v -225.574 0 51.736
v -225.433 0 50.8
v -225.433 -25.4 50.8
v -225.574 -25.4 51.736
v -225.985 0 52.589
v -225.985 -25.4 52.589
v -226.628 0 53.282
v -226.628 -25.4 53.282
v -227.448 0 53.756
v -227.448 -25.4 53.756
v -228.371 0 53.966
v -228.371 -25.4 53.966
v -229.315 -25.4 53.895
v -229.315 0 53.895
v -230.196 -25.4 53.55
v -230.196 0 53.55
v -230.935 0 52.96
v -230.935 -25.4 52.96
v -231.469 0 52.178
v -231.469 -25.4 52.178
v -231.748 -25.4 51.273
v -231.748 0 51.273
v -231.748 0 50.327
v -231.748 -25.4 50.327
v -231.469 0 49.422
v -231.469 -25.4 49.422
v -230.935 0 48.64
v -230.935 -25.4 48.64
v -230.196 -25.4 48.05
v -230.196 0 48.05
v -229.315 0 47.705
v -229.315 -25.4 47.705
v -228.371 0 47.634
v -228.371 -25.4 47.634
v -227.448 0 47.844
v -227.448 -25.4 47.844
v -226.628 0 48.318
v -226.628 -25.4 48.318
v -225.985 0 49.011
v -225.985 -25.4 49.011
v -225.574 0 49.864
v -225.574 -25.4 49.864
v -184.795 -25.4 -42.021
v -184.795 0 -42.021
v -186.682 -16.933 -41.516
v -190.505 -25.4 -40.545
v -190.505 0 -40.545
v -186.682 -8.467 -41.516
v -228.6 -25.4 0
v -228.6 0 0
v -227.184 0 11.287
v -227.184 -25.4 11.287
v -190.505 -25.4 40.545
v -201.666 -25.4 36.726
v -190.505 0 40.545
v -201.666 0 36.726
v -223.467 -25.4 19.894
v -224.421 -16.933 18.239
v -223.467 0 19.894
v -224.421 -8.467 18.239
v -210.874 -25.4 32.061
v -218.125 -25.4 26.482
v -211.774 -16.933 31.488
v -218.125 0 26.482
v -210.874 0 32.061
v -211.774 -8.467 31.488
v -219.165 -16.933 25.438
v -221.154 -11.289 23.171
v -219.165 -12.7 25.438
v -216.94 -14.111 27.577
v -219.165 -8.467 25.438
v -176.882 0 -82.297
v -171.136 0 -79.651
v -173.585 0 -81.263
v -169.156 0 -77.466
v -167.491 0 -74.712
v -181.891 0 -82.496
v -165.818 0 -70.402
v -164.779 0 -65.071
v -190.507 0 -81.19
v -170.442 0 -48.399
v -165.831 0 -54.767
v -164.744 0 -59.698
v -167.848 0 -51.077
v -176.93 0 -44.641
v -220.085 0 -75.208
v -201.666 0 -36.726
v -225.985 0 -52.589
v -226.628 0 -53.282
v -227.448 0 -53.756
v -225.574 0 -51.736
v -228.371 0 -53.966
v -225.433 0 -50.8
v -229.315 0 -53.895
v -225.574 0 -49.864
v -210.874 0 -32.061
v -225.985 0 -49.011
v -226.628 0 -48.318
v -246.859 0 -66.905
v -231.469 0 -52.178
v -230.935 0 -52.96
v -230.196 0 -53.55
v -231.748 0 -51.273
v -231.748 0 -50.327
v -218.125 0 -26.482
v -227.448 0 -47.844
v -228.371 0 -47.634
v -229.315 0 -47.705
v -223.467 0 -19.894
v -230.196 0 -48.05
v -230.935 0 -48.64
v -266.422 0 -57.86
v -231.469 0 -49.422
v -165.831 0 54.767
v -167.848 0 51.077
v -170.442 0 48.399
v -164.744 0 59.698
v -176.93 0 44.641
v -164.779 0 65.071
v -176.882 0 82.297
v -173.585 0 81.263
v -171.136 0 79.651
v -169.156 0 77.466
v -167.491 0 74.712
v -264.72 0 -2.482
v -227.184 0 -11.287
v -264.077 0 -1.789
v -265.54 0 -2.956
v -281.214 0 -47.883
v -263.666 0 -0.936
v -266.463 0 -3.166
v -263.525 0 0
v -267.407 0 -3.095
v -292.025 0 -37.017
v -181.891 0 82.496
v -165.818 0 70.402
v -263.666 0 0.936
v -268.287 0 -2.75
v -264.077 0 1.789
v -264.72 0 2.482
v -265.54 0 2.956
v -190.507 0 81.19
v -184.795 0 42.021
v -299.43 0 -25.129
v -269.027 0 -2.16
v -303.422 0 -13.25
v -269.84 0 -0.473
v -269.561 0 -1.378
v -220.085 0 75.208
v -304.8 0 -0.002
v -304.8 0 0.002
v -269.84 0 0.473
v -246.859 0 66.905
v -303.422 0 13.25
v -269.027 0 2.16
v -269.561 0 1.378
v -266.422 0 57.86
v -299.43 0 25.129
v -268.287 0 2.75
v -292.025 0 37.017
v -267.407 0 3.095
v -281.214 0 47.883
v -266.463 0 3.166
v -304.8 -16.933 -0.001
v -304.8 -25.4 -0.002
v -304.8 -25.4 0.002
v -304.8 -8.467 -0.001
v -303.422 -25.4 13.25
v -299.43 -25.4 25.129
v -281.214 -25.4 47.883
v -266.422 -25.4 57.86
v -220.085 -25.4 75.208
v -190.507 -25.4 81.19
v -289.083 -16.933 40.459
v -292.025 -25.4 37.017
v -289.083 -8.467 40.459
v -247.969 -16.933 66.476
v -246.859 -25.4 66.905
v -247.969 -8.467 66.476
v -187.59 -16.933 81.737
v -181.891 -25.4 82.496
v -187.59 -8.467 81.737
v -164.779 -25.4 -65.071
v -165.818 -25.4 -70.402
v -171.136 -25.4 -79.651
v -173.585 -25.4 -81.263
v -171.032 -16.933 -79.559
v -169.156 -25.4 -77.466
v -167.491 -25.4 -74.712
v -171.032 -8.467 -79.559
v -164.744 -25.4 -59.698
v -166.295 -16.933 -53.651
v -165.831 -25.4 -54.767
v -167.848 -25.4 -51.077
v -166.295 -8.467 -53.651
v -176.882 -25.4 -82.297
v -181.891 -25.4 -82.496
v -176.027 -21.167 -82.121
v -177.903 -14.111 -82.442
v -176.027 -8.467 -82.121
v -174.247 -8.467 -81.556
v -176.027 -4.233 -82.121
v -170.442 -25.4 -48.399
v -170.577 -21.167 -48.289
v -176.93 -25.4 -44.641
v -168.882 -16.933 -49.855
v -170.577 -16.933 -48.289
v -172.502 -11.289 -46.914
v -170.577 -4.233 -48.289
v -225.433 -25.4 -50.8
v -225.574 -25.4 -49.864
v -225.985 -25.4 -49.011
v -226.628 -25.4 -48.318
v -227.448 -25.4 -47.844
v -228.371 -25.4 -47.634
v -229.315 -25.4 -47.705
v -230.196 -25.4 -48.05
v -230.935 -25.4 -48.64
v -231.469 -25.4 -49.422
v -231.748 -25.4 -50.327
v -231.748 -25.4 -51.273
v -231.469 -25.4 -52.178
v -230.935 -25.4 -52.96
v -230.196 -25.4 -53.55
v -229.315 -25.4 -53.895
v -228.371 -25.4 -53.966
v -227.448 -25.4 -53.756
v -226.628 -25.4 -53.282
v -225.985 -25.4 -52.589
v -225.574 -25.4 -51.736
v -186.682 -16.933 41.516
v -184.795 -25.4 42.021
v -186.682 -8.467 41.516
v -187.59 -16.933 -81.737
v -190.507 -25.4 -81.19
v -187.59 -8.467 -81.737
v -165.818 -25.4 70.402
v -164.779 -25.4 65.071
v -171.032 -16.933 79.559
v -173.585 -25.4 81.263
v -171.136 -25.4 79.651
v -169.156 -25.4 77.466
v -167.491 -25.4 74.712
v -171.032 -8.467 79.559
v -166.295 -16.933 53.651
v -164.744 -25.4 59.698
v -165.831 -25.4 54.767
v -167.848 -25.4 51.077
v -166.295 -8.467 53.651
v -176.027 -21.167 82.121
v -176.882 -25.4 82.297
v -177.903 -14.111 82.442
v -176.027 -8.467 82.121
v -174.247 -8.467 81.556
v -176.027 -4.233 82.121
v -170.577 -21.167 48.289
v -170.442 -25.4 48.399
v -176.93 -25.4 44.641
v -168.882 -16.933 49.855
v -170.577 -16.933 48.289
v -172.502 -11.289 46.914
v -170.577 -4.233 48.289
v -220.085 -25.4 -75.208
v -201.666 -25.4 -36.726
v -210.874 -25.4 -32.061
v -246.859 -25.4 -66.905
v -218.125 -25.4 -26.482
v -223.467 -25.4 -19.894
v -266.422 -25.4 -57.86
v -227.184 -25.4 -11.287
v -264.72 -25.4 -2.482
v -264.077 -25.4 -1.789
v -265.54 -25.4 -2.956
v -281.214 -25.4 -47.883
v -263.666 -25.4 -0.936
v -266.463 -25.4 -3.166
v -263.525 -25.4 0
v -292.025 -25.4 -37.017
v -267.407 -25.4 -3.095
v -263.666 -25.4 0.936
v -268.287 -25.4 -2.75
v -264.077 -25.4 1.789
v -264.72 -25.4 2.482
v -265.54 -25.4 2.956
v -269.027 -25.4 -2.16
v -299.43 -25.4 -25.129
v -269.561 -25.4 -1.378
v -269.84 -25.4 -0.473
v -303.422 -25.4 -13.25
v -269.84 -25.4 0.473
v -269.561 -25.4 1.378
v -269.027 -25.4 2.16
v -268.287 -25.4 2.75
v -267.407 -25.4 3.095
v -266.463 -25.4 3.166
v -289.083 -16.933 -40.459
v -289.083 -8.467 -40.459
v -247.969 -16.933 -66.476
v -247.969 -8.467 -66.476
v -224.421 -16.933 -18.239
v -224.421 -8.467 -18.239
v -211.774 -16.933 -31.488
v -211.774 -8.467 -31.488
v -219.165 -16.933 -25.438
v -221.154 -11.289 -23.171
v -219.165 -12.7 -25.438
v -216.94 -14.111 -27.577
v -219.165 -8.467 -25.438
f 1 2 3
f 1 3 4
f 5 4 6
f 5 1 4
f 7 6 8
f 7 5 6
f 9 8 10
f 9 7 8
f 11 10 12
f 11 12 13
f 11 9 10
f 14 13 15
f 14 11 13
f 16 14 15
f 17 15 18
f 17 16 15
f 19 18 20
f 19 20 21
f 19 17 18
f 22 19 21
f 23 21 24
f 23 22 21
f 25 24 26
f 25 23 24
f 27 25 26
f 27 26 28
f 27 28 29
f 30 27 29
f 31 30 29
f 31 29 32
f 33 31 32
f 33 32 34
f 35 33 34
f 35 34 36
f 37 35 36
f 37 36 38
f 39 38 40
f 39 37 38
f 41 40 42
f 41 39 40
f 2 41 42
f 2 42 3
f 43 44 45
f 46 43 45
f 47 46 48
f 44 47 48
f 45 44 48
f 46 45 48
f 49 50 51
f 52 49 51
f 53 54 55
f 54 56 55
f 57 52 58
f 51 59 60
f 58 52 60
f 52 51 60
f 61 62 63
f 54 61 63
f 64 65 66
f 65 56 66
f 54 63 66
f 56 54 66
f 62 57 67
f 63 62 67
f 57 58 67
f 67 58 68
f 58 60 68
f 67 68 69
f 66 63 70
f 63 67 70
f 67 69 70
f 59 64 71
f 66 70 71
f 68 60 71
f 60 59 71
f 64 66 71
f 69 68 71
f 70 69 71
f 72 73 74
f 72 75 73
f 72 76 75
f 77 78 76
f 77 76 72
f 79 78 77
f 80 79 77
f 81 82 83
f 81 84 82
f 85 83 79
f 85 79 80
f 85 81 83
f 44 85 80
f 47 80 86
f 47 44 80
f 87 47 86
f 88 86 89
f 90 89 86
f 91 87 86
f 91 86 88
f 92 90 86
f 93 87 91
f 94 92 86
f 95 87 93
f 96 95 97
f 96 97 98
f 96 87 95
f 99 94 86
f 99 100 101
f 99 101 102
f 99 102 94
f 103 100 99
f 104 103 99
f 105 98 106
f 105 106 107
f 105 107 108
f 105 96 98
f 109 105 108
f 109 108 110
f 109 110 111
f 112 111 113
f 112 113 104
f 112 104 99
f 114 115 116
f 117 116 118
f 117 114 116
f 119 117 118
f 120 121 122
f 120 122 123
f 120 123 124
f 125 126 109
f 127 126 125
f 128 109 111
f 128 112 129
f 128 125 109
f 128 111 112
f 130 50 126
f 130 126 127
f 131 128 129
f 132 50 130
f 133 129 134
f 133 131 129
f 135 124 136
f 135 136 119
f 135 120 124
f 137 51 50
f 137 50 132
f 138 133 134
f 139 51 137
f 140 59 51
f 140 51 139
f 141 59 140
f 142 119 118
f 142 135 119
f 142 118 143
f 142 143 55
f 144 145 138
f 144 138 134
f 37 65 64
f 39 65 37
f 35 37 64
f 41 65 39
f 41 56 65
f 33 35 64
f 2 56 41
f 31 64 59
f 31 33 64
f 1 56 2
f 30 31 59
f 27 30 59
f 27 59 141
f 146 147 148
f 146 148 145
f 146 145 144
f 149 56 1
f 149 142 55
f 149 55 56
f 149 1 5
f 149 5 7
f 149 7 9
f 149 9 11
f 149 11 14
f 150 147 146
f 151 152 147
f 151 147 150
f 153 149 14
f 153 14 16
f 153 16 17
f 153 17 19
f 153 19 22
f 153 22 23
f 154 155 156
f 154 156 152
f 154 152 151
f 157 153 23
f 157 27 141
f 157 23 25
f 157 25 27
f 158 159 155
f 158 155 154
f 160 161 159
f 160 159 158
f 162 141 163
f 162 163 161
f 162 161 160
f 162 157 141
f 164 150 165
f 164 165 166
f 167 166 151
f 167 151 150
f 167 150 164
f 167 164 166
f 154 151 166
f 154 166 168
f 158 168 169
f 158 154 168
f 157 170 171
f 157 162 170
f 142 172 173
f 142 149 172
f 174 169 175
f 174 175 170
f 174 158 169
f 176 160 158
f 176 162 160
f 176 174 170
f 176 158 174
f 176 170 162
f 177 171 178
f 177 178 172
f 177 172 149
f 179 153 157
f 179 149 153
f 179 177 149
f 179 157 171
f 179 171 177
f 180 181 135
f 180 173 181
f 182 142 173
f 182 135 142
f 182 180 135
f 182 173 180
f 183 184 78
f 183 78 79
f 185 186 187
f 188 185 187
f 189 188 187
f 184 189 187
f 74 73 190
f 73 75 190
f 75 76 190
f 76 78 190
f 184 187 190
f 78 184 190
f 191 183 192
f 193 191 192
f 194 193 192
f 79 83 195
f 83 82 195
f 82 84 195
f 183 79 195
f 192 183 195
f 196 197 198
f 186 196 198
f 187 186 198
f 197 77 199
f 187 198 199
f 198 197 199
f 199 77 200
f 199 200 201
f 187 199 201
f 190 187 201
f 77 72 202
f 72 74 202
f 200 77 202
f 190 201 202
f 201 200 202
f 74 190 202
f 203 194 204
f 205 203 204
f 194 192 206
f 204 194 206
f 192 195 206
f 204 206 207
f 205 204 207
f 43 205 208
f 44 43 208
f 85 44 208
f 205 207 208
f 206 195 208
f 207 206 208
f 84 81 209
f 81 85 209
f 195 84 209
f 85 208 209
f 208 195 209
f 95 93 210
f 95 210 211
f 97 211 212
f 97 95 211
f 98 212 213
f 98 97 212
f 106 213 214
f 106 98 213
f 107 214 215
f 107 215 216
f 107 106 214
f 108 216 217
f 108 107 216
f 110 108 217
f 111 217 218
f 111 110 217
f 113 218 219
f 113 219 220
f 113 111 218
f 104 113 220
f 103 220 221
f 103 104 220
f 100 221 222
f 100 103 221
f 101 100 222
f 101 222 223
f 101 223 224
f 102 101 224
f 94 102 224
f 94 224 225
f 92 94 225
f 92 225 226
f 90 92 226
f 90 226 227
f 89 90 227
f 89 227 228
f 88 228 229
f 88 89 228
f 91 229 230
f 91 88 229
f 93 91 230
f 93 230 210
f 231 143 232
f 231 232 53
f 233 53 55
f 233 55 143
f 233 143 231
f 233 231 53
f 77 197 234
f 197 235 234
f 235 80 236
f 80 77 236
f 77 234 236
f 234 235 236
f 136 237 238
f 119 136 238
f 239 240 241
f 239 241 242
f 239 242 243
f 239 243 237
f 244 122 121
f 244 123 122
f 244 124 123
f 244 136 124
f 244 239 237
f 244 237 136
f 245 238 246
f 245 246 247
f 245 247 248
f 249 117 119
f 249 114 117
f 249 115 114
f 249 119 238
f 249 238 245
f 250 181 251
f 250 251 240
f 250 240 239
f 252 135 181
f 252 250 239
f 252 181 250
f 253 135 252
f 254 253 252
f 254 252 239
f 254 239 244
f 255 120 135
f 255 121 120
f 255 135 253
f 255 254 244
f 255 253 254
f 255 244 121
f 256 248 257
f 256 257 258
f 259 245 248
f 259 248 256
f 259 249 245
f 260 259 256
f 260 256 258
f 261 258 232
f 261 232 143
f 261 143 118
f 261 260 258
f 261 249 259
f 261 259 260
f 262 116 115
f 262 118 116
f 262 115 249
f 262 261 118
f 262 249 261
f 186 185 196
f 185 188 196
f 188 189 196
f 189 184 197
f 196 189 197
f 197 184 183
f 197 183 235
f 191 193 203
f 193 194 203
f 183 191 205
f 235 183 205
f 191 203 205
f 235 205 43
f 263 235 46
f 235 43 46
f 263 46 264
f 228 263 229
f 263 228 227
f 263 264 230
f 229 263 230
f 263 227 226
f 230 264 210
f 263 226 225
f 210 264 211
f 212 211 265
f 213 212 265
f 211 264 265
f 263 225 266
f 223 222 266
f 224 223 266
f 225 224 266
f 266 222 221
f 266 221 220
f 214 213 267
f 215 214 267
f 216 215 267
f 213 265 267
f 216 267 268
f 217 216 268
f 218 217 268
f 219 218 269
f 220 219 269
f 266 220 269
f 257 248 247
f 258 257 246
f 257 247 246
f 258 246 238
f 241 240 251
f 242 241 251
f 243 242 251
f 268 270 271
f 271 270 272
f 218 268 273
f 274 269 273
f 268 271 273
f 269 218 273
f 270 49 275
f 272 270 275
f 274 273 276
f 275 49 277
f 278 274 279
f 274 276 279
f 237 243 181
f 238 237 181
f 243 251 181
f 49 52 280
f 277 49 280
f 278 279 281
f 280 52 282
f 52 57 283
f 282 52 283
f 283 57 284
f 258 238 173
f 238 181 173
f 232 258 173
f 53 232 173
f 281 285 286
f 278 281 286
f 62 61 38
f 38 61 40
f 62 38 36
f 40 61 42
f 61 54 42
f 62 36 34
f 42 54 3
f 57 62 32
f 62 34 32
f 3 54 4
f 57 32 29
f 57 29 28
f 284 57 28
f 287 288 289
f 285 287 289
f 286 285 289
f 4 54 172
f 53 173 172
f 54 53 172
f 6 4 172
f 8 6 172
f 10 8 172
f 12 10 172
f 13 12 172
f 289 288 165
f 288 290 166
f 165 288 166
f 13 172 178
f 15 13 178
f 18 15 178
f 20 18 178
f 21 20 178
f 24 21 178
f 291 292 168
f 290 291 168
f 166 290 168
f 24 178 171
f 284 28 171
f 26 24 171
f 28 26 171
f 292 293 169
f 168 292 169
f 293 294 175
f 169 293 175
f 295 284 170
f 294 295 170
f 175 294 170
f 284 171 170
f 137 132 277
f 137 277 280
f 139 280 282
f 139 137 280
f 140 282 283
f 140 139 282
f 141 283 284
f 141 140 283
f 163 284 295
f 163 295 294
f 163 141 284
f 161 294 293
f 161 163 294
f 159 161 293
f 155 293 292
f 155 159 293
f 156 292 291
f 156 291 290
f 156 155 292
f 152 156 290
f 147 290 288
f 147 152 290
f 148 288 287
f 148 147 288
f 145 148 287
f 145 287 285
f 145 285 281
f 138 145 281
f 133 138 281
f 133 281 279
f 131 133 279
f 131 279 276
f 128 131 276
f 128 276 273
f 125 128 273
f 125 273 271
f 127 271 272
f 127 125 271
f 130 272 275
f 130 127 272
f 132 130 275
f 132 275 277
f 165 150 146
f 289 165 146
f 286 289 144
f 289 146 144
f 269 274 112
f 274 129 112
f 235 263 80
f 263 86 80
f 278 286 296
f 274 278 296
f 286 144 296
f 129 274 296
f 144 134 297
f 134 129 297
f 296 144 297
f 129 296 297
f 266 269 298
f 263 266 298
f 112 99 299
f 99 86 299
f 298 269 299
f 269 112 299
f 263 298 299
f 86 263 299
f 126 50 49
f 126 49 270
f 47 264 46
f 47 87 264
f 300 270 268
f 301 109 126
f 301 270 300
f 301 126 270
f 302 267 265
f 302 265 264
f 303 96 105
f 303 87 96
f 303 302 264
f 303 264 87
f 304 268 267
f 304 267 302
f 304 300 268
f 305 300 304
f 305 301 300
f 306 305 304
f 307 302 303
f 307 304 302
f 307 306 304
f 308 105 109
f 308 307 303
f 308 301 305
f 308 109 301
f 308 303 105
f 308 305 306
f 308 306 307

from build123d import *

# Parameters (mm, degrees)
F0_R     = 3.175
F1_DEPTH = 25.4


# Not quite as in the source:
# - ends of sketch curves that miss each other by under 0.0002 mm in the source are joined


with BuildPart() as f1:
    # F0 (on Front) → F1 (new body)
    with BuildSketch(Plane.XZ):
        with BuildLine():
            add(Edge.make_bspline(
                [(-228.6, 0), (-228.603328408, -20.9998549914), (-216.1362353399, -33.3187275092), (-190.5048638582, -40.5451878905)],
                knots=[0, 0, 0, 0, 96.8546122477, 96.8546122477, 96.8546122477, 96.8546122477], degree=3))
            add(Edge.make_bspline(
                [(-228.6, 0), (-228.603328408, 20.9998549914), (-216.1362353399, 33.3187275092), (-190.5048638582, 40.5451878905)],
                knots=[0, 0, 0, 0, 96.8546122477, 96.8546122477, 96.8546122477, 96.8546122477], degree=3))
            add(Edge.make_bspline(
                [(-190.5048638582, 40.5451878905), (-188.6690340196, 41.0627782819), (-186.7656708429, 41.5542443707), (-184.7945193799, 42.0209047272)],
                knots=[96.8546122477, 96.8546122477, 96.8546122477, 96.8546122477, 103.7917590678, 103.7917590678, 103.7917590678, 103.7917590678], degree=3))
            add(Edge.make_bspline(
                [(-181.8914412177, 82.4957251162), (-177.7740978469, 82.7671917451), (-166.6388871368, 81.1057466034), (-160.4841015231, 50.6684396177), (-176.6492852244, 44.2605429862), (-184.7945193799, 42.0209047272)],
                knots=[0.1201664208, 0.1201664208, 0.1201664208, 0.1201664208, 0.2987042421, 0.6454715168, 0.9336630859, 0.9336630859, 0.9336630859, 0.9336630859], degree=3))
            add(Edge.make_bspline(
                [(-190.5065755272, 81.190021553), (-187.6562706797, 81.6501805926), (-184.7832793111, 82.0849710788), (-181.8914412177, 82.4957251162)],
                knots=[152.2718692701, 152.2718692701, 152.2718692701, 152.2718692701, 159.2026765547, 159.2026765547, 159.2026765547, 159.2026765547], degree=3))
            add(Edge.make_bspline(
                [(-304.7999998765, 0.0020627141), (-304.7970834826, 48.7263819663), (-253.1268418931, 71.0804777771), (-190.5065755272, 81.190021553)],
                knots=[0.0042973705, 0.0042973705, 0.0042973705, 0.0042973705, 152.2718692701, 152.2718692701, 152.2718692701, 152.2718692701], degree=3))
            add(Edge.make_bspline(
                [(-304.8, -0.0020627142), (-304.8, -0.0006875504), (-304.7999999588, 0.0006875924), (-304.7999998765, 0.0020627141)],
                knots=[0, 0, 0, 0, 0.0042973705, 0.0042973705, 0.0042973705, 0.0042973705], degree=3))
            add(Edge.make_bspline(
                [(-304.8, -0.0020627142), (-304.7970834826, -48.7263819663), (-253.1268418931, -71.0804777771), (-190.5065755272, -81.190021553)],
                knots=[0.0042973705, 0.0042973705, 0.0042973705, 0.0042973705, 152.2718692701, 152.2718692701, 152.2718692701, 152.2718692701], degree=3))
            add(Edge.make_bspline(
                [(-190.5065755272, -81.190021553), (-187.6562706797, -81.6501805926), (-184.7832793111, -82.0849710788), (-181.8914412177, -82.4957251162)],
                knots=[152.2718692701, 152.2718692701, 152.2718692701, 152.2718692701, 159.2026765547, 159.2026765547, 159.2026765547, 159.2026765547], degree=3))
            add(Edge.make_bspline(
                [(-181.8914412177, -82.4957251162), (-177.7740978469, -82.7671917451), (-166.6388871368, -81.1057466034), (-160.4841015231, -50.6684396177), (-176.6492852244, -44.2605429862), (-184.7945193799, -42.0209047272)],
                knots=[0.1201664208, 0.1201664208, 0.1201664208, 0.1201664208, 0.2987042421, 0.6454715168, 0.9336630859, 0.9336630859, 0.9336630859, 0.9336630859], degree=3))
            add(Edge.make_bspline(
                [(-190.5048638582, -40.5451878905), (-188.6690340196, -41.0627782819), (-186.7656708429, -41.5542443707), (-184.7945193799, -42.0209047272)],
                knots=[96.8546122477, 96.8546122477, 96.8546122477, 96.8546122477, 103.7917590678, 103.7917590678, 103.7917590678, 103.7917590678], degree=3))
        make_face()
        with Locations((-228.6080516329, -50.8)):
            Circle(F0_R, mode=Mode.SUBTRACT)
        with Locations((-266.7, 0)):
            Circle(F0_R, mode=Mode.SUBTRACT)
        with Locations((-228.6080516329, 50.8)):
            Circle(F0_R, mode=Mode.SUBTRACT)
        with BuildLine():
            add(Edge.make_bspline(
                [(-190.5048638582, 40.5451878905), (-188.6690340196, 41.0627782819), (-186.7656708429, 41.5542443707), (-184.7945193799, 42.0209047272)],
                knots=[96.8546122477, 96.8546122477, 96.8546122477, 96.8546122477, 103.7917590678, 103.7917590678, 103.7917590678, 103.7917590678], degree=3))
            add(Edge.make_bspline(
                [(-184.7945193799, 42.0209047272), (-186.6694170397, 41.5053771867), (-188.587140449, 41.0252825386), (-190.5048638582, 40.5451878905)],
                knots=[0.9336630859, 0.9336630859, 0.9336630859, 0.9336630859, 1, 1, 1, 1], degree=3))
        make_face()
        with BuildLine():
            add(Edge.make_bspline(
                [(-184.7945193799, -42.0209047272), (-186.6694170397, -41.5053771867), (-188.587140449, -41.0252825386), (-190.5048638582, -40.5451878905)],
                knots=[0.9336630859, 0.9336630859, 0.9336630859, 0.9336630859, 1, 1, 1, 1], degree=3))
            add(Edge.make_bspline(
                [(-190.5048638582, -40.5451878905), (-188.6690340196, -41.0627782819), (-186.7656708429, -41.5542443707), (-184.7945193799, -42.0209047272)],
                knots=[96.8546122477, 96.8546122477, 96.8546122477, 96.8546122477, 103.7917590678, 103.7917590678, 103.7917590678, 103.7917590678], degree=3))
        make_face()
        with BuildLine():
            add(Edge.make_bspline(
                [(-190.5065755272, 81.190021553), (-187.6562706797, 81.6501805926), (-184.7832793111, 82.0849710788), (-181.8914412177, 82.4957251162)],
                knots=[152.2718692701, 152.2718692701, 152.2718692701, 152.2718692701, 159.2026765547, 159.2026765547, 159.2026765547, 159.2026765547], degree=3))
            add(Edge.make_bspline(
                [(-190.5065755272, 81.190021553), (-187.58461511, 81.7515168563), (-184.6626546928, 82.3130121597), (-181.8914412177, 82.4957251162)],
                knots=[0, 0, 0, 0, 0.1201664208, 0.1201664208, 0.1201664208, 0.1201664208], degree=3))
        make_face()
        with BuildLine():
            add(Edge.make_bspline(
                [(-190.5065755272, -81.190021553), (-187.58461511, -81.7515168563), (-184.6626546928, -82.3130121597), (-181.8914412177, -82.4957251162)],
                knots=[0, 0, 0, 0, 0.1201664208, 0.1201664208, 0.1201664208, 0.1201664208], degree=3))
            add(Edge.make_bspline(
                [(-190.5065755272, -81.190021553), (-187.6562706797, -81.6501805926), (-184.7832793111, -82.0849710788), (-181.8914412177, -82.4957251162)],
                knots=[152.2718692701, 152.2718692701, 152.2718692701, 152.2718692701, 159.2026765547, 159.2026765547, 159.2026765547, 159.2026765547], degree=3))
        make_face()
    extrude(amount=F1_DEPTH)


solid = f1.part
